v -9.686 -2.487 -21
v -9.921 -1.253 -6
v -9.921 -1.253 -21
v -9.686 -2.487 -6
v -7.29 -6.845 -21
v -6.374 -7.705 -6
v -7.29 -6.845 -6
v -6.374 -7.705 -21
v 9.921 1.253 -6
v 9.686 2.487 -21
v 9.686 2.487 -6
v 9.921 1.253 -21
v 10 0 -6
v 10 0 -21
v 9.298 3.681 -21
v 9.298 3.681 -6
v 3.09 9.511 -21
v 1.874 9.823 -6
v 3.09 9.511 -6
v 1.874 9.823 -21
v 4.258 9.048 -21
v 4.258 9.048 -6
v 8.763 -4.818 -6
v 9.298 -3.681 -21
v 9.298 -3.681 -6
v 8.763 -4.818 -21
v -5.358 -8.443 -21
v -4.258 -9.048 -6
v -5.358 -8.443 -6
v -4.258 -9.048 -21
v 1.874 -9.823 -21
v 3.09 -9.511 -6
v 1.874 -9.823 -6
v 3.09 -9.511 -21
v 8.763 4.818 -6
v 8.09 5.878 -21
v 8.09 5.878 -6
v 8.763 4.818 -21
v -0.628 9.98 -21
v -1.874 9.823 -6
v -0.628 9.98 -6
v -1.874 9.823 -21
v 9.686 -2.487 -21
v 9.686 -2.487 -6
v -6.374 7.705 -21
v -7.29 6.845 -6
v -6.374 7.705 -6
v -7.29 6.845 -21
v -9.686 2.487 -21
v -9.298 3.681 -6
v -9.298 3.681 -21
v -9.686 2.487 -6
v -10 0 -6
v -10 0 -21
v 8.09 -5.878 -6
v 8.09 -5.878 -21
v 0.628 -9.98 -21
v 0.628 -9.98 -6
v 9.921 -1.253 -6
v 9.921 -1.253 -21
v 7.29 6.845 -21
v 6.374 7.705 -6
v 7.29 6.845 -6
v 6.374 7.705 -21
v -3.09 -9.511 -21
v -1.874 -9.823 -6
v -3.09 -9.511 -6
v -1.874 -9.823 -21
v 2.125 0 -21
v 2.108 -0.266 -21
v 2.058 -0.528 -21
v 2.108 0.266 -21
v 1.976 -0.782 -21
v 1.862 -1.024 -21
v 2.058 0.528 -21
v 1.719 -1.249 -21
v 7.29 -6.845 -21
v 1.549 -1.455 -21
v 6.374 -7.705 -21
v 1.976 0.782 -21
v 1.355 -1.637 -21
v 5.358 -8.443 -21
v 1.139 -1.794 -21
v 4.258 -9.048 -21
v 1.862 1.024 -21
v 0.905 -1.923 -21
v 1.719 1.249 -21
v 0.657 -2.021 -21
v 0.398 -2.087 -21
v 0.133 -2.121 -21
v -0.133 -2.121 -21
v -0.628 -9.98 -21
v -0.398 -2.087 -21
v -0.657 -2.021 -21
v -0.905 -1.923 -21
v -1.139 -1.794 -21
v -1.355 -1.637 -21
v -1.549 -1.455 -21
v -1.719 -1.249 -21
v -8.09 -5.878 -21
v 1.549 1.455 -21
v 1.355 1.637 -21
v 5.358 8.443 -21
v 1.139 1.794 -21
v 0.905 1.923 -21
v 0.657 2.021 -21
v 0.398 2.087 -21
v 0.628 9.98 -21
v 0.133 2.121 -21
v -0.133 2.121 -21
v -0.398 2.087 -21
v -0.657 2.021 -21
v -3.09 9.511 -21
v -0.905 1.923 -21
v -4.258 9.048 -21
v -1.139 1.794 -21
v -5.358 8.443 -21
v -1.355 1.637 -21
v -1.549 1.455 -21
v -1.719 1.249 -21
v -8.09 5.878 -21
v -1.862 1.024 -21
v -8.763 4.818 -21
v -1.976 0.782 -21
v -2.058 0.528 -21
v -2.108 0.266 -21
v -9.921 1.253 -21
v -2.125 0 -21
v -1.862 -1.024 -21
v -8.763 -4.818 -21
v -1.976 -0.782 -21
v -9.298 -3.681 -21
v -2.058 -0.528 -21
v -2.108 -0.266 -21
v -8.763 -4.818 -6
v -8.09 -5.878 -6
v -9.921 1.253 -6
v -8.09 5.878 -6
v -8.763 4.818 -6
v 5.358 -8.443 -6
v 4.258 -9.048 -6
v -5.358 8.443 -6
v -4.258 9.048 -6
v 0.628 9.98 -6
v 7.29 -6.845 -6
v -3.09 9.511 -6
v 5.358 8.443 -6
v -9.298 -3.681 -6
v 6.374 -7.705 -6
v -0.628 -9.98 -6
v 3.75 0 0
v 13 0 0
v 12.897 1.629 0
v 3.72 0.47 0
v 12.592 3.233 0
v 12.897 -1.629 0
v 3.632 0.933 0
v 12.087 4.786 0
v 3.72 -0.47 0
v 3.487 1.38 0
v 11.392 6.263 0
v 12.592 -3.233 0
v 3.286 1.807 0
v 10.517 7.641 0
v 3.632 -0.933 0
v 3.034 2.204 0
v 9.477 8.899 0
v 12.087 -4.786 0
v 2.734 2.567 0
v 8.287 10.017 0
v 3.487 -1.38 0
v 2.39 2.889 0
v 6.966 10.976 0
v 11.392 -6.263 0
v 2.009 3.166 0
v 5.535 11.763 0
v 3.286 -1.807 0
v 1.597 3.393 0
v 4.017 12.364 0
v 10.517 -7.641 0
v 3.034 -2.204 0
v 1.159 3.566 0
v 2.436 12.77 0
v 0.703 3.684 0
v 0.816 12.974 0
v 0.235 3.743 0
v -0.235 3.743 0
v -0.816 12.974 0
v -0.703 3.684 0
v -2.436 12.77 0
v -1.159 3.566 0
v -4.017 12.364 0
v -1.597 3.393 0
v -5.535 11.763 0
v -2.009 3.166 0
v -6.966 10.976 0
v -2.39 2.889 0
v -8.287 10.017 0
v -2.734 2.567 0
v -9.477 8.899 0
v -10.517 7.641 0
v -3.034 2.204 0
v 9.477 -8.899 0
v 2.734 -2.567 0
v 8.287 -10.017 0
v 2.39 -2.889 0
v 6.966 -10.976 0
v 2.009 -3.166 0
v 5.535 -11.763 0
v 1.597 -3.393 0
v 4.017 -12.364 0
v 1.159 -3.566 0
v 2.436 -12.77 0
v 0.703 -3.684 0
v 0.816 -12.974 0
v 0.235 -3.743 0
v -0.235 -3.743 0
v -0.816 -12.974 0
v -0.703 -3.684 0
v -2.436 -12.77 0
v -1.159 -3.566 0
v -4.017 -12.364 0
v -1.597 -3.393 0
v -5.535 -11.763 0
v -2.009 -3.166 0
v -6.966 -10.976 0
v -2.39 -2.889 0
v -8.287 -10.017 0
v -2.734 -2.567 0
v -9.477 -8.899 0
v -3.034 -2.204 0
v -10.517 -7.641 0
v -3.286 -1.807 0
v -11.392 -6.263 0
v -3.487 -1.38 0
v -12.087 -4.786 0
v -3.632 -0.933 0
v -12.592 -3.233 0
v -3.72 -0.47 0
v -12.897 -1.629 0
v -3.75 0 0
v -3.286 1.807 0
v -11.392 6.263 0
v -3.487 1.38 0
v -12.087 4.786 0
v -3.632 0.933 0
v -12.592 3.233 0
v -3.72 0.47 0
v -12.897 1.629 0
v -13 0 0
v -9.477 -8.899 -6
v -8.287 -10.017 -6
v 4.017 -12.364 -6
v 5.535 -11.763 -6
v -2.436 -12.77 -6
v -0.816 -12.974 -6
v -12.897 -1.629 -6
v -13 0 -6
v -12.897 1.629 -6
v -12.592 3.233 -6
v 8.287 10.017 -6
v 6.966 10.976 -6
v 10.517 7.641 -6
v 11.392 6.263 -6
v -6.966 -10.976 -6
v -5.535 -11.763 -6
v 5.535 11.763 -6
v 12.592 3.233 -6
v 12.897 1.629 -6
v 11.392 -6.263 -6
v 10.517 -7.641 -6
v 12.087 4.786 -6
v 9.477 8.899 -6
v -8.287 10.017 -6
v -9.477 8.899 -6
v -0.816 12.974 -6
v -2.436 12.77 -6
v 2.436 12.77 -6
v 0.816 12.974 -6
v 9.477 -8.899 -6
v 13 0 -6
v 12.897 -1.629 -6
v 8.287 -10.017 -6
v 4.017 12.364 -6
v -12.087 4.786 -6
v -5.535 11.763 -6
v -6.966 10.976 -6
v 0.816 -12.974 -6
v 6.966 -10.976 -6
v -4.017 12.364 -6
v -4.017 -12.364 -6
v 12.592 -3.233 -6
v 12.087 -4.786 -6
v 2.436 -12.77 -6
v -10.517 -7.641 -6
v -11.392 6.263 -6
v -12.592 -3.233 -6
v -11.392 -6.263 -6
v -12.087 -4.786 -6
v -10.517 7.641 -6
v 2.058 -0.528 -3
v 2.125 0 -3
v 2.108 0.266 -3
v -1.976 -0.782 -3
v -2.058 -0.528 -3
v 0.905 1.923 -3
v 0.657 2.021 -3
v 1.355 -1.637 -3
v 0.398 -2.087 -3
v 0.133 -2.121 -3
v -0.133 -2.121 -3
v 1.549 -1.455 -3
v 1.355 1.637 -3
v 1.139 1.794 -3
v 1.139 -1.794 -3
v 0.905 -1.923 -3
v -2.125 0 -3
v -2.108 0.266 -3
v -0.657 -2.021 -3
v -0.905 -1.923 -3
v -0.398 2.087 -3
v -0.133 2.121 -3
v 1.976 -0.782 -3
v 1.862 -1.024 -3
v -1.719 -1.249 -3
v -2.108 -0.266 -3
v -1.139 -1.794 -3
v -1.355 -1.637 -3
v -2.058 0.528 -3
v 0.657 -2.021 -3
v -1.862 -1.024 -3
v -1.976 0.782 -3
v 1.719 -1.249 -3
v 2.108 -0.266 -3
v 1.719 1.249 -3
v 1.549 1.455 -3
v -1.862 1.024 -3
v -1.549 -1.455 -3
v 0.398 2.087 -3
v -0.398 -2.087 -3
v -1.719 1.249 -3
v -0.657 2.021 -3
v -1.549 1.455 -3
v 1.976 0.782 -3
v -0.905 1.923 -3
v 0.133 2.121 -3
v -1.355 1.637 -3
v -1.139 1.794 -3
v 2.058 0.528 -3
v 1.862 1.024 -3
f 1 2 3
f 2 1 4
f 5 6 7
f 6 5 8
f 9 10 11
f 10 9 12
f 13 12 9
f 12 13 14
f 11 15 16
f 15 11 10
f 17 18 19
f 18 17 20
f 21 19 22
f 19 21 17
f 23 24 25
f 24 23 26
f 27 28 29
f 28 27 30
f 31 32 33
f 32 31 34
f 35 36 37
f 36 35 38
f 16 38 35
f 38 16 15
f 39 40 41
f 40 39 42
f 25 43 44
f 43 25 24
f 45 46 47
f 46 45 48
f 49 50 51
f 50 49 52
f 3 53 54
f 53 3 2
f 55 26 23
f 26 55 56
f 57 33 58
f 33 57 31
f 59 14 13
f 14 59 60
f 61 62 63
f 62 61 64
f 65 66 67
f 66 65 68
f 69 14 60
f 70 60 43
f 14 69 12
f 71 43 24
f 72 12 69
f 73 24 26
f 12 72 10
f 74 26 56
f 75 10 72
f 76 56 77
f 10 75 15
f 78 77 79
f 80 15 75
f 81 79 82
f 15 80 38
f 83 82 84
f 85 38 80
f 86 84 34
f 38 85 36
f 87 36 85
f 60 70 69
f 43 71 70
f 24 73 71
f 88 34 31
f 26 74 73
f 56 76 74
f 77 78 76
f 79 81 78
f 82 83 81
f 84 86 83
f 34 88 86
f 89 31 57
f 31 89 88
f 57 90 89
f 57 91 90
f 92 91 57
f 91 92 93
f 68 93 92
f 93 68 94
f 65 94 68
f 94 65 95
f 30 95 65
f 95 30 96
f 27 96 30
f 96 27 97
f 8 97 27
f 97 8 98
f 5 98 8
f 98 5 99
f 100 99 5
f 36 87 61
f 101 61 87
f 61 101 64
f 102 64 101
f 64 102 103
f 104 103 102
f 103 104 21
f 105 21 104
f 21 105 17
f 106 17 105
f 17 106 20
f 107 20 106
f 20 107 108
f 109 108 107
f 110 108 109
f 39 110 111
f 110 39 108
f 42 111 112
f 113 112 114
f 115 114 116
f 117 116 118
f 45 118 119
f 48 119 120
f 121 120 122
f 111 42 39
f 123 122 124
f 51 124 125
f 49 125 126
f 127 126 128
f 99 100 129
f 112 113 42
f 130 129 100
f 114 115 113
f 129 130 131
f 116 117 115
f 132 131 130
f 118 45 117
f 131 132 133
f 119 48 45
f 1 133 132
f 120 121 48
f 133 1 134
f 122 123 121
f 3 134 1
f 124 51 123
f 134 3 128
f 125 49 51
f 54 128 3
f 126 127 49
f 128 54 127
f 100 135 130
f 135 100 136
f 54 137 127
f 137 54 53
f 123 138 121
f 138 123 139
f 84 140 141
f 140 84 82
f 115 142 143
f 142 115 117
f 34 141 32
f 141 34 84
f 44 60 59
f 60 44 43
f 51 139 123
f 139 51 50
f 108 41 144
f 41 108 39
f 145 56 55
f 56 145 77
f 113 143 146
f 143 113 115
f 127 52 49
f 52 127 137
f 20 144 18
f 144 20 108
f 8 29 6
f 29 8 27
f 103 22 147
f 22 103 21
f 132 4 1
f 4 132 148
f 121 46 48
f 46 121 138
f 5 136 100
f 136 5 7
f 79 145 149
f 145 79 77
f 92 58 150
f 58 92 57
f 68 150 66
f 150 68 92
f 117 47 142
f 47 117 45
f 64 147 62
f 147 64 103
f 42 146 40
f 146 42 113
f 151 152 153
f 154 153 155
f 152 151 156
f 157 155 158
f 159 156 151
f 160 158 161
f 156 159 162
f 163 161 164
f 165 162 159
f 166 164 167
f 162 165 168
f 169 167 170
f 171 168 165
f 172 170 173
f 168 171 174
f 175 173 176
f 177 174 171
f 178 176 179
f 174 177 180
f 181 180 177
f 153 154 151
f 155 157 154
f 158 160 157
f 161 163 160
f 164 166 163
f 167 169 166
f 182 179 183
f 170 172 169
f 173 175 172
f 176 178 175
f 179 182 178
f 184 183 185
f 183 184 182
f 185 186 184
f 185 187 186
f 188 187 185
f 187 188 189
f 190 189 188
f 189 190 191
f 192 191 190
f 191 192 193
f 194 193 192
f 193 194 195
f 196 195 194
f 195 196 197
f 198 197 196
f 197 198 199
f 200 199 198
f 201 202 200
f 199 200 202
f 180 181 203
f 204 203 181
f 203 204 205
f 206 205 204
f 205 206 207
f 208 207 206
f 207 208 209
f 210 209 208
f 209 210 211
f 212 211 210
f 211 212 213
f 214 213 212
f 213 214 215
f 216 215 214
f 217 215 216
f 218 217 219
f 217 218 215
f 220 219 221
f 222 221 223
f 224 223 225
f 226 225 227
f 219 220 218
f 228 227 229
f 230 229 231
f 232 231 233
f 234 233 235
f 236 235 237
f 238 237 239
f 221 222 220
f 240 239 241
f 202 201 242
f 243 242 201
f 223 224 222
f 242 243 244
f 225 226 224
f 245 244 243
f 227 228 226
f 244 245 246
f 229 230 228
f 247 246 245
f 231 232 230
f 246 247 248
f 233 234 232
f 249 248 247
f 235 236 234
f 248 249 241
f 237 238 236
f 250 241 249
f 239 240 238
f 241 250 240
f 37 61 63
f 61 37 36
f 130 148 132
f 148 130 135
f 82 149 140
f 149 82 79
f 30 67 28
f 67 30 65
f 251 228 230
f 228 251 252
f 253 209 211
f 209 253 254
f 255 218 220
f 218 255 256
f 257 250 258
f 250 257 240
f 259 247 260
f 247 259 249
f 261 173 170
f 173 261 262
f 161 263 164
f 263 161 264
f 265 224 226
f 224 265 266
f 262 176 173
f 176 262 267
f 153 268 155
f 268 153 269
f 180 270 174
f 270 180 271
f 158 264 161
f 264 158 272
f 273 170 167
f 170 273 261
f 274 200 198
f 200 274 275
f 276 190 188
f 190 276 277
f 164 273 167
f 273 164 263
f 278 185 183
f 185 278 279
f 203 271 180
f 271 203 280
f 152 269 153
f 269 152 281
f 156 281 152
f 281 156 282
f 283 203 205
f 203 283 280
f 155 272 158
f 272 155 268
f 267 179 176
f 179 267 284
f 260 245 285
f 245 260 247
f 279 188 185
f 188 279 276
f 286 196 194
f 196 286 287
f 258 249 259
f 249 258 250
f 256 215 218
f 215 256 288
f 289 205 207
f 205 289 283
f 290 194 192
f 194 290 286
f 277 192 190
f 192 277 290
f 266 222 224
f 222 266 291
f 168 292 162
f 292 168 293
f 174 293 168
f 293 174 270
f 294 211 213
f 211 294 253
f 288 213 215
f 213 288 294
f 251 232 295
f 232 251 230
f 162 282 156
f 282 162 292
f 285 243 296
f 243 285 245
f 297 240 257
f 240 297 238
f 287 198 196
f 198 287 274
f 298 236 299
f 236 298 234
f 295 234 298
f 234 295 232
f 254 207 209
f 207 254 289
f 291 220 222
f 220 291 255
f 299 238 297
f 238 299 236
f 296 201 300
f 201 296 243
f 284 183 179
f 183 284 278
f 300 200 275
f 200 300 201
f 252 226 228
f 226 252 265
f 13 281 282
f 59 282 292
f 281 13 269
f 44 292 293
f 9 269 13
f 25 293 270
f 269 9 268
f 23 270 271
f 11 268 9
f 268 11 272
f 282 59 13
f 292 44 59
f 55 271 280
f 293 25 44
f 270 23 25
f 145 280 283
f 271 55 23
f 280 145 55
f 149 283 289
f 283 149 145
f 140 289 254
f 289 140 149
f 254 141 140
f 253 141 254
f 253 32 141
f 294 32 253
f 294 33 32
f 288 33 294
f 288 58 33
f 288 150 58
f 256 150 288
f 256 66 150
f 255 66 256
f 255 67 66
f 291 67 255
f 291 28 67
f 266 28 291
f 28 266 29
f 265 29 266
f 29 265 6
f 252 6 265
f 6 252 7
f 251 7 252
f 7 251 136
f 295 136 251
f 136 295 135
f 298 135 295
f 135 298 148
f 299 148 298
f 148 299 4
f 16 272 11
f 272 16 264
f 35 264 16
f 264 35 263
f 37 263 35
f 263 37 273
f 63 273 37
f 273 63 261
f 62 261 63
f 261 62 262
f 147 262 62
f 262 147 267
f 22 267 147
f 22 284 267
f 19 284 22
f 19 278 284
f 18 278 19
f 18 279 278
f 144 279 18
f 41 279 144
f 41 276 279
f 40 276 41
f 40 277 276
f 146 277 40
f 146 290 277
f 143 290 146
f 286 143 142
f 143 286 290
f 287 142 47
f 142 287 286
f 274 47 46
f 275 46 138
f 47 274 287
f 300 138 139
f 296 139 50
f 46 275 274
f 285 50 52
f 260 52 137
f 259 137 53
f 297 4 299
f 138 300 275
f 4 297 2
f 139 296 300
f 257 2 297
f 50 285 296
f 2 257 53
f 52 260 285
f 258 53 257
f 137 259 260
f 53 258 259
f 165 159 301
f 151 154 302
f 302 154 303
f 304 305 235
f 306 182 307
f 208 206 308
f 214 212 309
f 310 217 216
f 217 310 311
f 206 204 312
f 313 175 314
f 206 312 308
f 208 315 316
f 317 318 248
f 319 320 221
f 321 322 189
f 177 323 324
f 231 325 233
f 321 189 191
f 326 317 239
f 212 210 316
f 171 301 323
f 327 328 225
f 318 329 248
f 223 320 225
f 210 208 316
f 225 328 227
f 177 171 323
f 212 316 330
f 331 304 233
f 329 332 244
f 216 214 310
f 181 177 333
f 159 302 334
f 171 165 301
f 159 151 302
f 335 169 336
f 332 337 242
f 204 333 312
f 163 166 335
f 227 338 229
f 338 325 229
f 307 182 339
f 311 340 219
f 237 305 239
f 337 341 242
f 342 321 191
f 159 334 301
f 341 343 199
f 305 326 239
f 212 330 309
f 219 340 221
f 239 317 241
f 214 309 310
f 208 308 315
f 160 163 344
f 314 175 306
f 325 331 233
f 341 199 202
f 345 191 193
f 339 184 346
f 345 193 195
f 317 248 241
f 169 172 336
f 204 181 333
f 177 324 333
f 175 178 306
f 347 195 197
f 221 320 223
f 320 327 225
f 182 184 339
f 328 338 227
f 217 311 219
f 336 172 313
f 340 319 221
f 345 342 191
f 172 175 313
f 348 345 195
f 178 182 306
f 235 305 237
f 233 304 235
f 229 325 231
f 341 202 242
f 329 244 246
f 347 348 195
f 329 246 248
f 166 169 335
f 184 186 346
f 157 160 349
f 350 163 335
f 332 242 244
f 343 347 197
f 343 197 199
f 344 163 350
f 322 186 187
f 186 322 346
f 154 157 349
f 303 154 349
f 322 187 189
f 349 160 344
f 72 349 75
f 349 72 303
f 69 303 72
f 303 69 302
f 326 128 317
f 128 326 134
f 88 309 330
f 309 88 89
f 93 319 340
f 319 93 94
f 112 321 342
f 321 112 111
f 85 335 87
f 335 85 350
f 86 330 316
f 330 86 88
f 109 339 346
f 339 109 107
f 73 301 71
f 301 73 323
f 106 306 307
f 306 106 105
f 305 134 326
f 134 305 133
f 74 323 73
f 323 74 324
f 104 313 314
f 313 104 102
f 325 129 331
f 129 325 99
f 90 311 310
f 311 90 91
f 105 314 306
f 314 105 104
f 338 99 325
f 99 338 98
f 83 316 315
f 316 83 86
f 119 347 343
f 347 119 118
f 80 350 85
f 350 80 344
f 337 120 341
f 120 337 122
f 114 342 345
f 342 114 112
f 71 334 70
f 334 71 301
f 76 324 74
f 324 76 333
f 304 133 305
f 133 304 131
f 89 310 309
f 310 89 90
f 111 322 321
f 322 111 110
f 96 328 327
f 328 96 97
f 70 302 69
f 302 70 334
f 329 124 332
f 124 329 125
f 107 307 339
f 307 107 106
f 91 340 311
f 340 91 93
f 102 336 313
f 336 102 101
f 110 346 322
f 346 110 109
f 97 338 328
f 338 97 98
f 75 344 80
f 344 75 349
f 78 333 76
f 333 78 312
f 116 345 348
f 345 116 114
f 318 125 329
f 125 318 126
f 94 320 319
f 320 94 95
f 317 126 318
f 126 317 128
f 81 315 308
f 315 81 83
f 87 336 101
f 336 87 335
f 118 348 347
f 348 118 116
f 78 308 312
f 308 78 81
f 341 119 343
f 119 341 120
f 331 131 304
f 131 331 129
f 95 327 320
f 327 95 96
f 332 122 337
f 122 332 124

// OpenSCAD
$fn = 50;


difference() {
	union() {
		translate(v = [0, 0, -21.0000000000]) {
			cylinder(h = 21, r = 10.0000000000);
		}
		translate(v = [0, 0, -6.0000000000]) {
			cylinder(h = 6, r = 13.0000000000);
		}
	}
	union() {
		translate(v = [0, 0, 0]) {
			rotate(a = [0, 0, 0]) {
				difference() {
					union() {
						#translate(v = [0, 0, -21.0000000000]) {
							cylinder(h = 21, r = 2.0000000000);
						}
						#translate(v = [0, 0, -3]) {
							cylinder(h = 3, r = 10.0000000000, r1 = 2.1250000000, r2 = 3.7500000000);
						}
						#translate(v = [0, 0, -21.0000000000]) {
							cylinder(h = 21, r = 2.1250000000);
						}
						#translate(v = [0, 0, -21.0000000000]) {
							cylinder(h = 21, r = 2.0000000000);
						}
					}
					union();
				}
			}
		}
	}
}
